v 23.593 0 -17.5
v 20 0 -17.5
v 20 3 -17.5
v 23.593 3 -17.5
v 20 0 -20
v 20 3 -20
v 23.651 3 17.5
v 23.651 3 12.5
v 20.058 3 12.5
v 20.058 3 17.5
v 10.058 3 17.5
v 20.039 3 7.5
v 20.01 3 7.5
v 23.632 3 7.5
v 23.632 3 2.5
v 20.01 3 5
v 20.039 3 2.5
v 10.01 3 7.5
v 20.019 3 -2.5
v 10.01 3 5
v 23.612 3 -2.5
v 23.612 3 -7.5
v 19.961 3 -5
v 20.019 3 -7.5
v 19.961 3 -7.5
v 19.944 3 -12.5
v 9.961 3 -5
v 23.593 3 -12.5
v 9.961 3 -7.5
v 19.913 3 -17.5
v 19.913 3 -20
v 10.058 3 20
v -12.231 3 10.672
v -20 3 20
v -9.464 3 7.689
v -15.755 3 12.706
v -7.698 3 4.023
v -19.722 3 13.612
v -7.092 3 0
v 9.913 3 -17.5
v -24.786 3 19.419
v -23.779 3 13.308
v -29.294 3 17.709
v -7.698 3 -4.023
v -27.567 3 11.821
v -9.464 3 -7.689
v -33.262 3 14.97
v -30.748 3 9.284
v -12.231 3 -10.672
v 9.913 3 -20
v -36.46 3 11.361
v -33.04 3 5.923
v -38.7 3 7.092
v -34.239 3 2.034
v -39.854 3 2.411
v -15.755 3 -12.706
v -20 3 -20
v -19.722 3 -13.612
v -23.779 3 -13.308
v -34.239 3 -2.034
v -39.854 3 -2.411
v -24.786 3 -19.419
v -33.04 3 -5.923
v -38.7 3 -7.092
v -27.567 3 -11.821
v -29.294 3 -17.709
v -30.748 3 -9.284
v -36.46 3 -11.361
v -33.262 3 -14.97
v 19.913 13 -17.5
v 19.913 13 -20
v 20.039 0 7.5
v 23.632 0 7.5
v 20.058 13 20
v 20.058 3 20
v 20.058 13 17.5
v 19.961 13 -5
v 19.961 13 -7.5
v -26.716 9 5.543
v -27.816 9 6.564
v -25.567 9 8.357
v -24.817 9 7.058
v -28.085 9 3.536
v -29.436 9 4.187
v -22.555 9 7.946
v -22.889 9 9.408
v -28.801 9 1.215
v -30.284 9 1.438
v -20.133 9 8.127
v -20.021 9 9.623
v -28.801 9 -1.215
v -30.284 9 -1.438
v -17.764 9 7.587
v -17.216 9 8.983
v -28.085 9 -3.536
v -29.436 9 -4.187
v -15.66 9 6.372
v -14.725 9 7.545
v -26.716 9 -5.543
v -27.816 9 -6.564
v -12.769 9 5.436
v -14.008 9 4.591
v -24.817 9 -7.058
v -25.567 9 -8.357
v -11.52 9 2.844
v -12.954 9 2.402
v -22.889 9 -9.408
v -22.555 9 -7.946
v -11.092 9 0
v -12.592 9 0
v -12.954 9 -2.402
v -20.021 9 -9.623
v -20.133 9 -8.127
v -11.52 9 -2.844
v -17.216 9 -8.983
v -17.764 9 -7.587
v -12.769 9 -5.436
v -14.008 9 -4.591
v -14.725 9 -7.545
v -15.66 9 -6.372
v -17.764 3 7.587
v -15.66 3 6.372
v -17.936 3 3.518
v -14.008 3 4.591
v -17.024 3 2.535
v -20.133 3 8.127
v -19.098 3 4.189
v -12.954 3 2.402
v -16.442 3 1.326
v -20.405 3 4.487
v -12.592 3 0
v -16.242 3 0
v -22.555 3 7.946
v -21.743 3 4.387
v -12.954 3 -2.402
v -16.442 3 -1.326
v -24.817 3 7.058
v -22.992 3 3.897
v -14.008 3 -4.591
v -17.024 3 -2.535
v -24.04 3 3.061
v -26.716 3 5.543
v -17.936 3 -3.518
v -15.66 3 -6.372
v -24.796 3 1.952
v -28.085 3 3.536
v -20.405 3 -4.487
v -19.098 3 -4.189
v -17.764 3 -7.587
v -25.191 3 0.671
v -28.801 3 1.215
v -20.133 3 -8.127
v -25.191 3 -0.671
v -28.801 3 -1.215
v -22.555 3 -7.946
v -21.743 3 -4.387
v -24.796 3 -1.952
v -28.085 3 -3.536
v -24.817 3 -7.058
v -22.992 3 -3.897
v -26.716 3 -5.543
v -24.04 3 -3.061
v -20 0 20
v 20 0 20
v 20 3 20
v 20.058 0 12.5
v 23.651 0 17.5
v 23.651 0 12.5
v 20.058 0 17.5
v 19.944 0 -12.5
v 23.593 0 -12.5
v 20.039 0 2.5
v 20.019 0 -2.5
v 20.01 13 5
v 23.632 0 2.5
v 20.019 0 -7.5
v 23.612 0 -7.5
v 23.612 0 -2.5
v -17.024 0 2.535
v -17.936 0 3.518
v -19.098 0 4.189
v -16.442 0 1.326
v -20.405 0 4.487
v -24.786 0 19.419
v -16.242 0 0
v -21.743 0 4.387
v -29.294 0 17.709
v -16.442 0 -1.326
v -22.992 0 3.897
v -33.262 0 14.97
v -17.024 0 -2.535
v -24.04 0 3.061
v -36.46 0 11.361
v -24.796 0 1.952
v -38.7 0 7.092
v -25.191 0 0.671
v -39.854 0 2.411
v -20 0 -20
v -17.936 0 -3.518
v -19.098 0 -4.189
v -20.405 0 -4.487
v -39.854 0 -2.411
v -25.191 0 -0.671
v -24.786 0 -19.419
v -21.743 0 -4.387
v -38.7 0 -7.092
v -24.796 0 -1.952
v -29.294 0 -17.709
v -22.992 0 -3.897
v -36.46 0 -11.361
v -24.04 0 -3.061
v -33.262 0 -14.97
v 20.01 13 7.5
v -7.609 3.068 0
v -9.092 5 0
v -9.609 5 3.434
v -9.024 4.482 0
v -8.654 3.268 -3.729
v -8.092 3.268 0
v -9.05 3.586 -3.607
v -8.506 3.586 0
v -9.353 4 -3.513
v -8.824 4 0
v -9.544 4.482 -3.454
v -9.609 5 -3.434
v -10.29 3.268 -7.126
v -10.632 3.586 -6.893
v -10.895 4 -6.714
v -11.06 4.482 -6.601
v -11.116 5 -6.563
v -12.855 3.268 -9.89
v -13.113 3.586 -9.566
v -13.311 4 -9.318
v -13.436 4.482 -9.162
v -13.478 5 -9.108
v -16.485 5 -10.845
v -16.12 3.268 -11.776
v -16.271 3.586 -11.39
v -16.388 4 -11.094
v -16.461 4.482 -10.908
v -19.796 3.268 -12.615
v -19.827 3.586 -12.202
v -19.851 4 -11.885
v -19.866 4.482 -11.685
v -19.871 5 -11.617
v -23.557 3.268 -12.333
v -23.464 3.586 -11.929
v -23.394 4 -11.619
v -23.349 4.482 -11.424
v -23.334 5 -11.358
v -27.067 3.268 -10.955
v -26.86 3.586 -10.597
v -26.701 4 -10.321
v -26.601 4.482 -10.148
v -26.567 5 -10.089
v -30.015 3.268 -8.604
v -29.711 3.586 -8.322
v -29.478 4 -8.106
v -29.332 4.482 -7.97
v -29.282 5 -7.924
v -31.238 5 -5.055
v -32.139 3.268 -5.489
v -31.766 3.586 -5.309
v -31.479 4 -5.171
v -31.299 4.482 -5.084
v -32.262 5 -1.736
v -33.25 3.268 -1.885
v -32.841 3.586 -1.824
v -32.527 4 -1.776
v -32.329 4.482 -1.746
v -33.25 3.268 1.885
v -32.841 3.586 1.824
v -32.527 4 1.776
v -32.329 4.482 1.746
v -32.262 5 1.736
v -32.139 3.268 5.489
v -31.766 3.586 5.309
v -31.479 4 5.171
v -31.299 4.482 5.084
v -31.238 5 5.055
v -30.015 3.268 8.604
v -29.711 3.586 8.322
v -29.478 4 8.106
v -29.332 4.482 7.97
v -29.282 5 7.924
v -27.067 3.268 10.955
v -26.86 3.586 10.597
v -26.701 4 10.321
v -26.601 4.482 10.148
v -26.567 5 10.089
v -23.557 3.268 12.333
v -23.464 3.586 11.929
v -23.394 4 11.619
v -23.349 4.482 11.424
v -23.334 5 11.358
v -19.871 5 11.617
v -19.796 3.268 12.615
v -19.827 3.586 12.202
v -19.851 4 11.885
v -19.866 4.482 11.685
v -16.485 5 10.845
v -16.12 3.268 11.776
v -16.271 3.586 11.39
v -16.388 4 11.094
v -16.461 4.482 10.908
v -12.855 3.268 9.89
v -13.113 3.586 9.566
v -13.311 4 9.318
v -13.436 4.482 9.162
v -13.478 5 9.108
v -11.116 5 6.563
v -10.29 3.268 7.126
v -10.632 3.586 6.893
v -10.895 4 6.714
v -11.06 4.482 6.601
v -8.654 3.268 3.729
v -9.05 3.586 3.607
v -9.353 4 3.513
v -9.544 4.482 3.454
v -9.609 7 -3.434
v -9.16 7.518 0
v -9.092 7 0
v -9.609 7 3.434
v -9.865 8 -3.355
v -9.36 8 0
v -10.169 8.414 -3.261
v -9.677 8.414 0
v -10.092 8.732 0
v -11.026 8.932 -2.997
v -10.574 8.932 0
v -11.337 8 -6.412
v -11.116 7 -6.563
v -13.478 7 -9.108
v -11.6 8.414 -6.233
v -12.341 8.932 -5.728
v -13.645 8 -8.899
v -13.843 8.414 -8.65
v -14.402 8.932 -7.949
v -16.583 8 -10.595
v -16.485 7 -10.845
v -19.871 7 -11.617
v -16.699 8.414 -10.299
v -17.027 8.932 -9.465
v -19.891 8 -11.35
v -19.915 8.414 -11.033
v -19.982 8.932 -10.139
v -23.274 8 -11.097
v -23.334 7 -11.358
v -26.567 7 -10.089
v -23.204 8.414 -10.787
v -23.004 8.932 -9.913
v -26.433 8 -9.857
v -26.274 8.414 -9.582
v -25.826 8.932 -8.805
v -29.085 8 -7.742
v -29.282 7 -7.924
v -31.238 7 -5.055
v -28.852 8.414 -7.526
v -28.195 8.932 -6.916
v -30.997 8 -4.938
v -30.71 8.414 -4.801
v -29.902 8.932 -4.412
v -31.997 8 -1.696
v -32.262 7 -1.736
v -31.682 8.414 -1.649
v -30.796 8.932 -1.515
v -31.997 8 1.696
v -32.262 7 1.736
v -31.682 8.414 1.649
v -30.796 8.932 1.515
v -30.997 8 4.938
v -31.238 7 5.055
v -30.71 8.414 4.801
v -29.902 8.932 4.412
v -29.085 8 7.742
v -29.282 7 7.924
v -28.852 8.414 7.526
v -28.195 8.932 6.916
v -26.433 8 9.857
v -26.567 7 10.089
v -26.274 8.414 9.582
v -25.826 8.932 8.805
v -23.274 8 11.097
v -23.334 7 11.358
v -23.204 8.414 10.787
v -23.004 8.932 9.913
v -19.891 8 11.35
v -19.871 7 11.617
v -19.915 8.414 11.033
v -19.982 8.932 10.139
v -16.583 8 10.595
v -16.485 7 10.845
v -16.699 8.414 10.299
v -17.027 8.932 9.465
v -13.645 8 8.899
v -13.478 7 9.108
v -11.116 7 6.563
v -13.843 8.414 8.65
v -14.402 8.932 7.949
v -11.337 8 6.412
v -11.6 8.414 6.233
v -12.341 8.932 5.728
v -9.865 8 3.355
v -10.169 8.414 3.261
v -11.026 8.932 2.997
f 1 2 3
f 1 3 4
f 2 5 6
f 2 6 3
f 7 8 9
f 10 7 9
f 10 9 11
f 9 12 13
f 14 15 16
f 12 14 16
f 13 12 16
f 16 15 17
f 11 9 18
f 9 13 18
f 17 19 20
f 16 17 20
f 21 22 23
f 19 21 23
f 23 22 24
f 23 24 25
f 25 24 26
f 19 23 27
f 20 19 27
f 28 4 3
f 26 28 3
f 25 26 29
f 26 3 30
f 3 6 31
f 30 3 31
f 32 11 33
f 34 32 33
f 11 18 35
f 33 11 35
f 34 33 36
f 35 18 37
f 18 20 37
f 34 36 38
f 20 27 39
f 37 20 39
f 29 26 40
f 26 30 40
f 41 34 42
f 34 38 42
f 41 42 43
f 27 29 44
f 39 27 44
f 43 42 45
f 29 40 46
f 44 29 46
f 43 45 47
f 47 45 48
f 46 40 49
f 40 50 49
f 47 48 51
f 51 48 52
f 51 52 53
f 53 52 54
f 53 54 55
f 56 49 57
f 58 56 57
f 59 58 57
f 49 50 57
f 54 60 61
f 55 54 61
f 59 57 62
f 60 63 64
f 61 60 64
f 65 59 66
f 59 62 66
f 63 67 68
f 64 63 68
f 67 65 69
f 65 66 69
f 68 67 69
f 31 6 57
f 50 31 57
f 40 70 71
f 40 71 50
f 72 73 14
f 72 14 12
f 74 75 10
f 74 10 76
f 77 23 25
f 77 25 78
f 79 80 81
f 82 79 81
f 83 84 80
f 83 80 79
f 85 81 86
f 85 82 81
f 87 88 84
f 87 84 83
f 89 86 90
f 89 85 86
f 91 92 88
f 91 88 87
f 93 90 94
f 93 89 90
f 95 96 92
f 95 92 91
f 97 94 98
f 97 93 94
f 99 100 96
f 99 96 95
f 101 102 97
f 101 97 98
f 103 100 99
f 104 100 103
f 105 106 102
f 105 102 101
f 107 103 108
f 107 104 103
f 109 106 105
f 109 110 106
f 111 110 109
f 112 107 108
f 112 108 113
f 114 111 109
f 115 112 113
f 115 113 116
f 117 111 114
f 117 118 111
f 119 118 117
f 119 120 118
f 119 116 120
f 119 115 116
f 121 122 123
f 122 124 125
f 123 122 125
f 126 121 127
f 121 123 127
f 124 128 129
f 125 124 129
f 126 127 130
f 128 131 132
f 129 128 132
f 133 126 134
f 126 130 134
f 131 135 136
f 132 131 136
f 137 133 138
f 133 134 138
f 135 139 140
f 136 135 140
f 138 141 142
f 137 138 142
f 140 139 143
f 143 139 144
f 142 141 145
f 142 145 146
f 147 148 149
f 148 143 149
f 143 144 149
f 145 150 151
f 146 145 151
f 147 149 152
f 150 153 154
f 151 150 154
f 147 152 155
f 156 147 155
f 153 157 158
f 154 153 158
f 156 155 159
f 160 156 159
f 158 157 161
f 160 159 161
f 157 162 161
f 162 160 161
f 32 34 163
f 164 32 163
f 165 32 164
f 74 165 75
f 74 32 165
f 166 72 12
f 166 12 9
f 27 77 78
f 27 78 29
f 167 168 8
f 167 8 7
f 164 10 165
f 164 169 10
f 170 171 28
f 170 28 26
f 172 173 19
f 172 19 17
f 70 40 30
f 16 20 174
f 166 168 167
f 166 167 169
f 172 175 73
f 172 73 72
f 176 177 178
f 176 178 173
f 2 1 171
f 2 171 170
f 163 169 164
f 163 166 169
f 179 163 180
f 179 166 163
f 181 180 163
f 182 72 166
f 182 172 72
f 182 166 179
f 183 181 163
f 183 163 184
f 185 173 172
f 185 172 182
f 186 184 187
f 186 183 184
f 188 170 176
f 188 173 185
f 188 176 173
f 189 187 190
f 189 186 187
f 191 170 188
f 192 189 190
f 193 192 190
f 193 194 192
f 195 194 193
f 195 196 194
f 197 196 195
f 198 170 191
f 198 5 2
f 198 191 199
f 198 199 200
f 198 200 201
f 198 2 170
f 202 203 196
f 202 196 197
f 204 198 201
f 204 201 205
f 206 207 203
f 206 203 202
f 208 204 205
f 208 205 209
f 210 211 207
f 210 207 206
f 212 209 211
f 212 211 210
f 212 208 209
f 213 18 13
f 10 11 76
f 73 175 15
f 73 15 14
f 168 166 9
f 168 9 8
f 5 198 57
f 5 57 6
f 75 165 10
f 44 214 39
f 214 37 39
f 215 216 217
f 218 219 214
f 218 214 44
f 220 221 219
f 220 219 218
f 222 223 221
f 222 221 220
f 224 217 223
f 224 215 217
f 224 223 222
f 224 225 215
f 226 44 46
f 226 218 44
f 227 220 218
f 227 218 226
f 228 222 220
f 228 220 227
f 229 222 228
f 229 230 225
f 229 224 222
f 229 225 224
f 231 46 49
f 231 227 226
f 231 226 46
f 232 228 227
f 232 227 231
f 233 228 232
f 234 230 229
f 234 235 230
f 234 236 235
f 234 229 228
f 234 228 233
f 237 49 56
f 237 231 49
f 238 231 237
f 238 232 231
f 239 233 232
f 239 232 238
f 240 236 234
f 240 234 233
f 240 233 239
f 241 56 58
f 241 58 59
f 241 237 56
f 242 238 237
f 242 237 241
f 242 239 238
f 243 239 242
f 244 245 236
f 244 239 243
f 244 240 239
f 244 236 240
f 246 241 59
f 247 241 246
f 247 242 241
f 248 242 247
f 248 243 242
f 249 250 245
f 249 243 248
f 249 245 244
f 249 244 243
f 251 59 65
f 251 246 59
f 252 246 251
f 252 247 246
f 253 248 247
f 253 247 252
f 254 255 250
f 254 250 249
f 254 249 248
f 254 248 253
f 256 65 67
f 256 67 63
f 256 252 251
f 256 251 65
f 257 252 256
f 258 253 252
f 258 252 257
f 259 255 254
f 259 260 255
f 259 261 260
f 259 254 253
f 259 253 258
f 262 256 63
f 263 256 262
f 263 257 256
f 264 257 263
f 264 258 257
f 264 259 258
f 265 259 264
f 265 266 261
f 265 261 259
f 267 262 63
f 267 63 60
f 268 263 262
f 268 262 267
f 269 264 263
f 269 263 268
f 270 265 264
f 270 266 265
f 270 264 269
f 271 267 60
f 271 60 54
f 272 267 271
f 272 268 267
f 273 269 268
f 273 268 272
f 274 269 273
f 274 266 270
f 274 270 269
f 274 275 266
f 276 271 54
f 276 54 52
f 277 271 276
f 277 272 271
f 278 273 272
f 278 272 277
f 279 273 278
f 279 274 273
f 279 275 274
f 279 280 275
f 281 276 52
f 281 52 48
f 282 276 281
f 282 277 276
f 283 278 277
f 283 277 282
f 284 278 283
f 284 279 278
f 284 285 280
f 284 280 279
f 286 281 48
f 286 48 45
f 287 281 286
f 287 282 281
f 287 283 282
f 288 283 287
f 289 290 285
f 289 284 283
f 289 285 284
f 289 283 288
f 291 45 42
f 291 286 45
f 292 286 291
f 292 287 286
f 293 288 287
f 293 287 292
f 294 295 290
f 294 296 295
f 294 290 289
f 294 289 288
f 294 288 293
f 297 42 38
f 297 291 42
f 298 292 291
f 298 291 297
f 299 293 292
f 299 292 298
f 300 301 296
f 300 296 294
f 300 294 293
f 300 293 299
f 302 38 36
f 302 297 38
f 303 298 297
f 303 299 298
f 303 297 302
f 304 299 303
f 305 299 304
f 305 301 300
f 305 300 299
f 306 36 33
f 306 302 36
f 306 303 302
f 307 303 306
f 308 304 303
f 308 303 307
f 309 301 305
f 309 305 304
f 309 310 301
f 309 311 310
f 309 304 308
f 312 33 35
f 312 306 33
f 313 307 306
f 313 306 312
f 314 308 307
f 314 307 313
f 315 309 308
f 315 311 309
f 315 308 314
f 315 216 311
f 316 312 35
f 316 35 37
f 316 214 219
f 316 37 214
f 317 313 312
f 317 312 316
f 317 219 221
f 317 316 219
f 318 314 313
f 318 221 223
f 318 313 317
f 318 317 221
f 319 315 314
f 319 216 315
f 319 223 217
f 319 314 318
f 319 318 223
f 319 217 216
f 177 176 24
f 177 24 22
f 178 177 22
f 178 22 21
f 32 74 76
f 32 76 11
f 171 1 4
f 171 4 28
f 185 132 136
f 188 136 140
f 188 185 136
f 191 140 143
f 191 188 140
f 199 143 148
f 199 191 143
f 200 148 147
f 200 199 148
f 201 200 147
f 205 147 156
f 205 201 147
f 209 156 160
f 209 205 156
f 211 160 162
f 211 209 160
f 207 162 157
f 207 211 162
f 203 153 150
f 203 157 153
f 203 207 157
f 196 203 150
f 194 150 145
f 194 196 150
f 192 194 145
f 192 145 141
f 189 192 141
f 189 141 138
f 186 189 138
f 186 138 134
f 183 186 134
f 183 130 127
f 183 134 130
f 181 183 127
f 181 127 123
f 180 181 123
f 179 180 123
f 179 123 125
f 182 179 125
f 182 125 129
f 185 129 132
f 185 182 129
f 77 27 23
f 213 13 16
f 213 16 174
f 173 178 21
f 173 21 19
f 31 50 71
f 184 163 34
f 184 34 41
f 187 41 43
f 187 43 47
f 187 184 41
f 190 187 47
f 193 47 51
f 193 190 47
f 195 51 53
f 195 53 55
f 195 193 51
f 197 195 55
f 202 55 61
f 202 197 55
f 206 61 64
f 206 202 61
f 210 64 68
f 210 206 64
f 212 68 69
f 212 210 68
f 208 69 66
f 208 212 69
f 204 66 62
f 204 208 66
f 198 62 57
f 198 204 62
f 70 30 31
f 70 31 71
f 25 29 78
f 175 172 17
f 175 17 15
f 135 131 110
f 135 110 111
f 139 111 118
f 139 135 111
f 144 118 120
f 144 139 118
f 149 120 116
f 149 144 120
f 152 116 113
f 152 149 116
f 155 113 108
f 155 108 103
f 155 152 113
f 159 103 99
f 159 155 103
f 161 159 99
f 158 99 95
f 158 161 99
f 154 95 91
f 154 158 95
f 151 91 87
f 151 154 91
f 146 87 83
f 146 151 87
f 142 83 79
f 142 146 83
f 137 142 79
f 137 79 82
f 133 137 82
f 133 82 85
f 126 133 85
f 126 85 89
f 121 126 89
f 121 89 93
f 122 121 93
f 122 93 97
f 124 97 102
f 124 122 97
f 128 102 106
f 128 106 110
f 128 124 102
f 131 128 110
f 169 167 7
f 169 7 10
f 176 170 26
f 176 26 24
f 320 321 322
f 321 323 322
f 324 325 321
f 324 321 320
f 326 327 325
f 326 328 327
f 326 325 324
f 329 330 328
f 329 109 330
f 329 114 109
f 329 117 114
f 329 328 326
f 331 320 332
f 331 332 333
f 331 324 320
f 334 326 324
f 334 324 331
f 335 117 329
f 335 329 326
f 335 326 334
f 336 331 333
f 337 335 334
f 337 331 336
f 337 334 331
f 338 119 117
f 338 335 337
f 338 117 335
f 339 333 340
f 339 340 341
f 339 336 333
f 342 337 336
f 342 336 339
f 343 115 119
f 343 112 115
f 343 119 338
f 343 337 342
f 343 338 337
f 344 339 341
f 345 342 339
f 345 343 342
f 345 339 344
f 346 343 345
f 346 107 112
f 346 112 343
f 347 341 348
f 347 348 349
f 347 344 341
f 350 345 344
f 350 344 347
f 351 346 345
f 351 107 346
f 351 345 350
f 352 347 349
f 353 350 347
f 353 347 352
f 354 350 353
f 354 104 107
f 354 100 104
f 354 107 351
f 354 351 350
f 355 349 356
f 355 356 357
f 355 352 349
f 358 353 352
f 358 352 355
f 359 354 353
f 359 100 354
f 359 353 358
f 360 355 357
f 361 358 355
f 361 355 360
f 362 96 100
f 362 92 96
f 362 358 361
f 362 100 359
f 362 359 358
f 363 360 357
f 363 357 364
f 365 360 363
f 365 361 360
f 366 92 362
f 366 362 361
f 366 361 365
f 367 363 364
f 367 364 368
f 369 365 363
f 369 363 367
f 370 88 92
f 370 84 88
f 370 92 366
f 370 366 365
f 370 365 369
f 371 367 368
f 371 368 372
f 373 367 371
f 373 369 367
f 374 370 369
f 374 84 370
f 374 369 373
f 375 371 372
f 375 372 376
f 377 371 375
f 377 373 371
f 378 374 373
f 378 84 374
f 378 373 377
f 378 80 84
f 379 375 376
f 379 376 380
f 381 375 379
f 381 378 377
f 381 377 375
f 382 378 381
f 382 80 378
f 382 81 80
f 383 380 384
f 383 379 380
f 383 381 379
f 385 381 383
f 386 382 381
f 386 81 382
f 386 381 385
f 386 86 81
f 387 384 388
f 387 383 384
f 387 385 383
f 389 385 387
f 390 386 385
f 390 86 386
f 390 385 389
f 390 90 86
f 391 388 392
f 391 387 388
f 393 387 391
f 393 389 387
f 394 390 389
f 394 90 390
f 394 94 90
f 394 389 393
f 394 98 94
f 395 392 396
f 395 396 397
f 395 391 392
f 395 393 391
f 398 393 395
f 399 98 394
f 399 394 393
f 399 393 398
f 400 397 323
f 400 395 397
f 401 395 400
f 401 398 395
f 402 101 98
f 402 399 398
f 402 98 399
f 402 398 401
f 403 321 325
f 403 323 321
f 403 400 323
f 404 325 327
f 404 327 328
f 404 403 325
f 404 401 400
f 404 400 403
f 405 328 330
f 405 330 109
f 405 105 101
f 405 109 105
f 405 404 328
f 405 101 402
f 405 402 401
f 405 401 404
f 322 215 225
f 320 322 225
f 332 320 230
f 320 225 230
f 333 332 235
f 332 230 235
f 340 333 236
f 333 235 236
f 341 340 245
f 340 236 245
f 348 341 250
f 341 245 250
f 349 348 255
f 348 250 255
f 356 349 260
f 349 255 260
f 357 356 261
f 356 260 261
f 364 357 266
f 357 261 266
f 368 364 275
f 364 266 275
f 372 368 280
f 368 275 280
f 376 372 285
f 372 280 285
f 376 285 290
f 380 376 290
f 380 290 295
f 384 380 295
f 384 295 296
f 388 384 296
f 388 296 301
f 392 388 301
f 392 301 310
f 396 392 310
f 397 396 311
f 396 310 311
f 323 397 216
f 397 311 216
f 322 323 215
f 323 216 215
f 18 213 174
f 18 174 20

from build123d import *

# Parameters (mm, degrees)
BOSS_EXTRUDE1_DEPTH = 3
BOSS_EXTRUDE3_DEPTH = 2.5
LPATTERN2_COUNT     = 4
LPATTERN2_PITCH     = 12.5
SKETCH3_R           = 11.65
SKETCH3_R_2         = 8.15
BOSS_EXTRUDE4_DEPTH = 6
SKETCH4_R           = 4.5
CUT_EXTRUDE2_DEPTH  = 14
FILLET1_R           = 2
FILLET2_R           = 2


with BuildPart() as part:
    # Sketch1 → Boss-Extrude1 (new body)
    with BuildSketch(Plane(origin=(0, 0, 0), x_dir=(1, 0, 0), z_dir=(0, 1, 0))):
        with BuildLine():
            Line((20, 17.5), (23.592842073, 17.5))
            Line((23.592842073, 17.5), (23.592842073, 12.5))
            Line((23.592842073, 12.5), (19.944472227, 12.5))
            Line((19.944472227, 12.5), (20.019420438, 7.500018858))
            Line((20.019420438, 7.500018858), (23.612262511, 7.500018858))
            Line((23.612262511, 7.500018858), (23.612262511, 2.500018858))
            Line((23.612262511, 2.500018858), (20.019420438, 2.500018858))
            Line((20.019420438, 2.500018858), (20.038840876, -2.499962285))
            Line((20.038840876, -2.499962285), (23.63168295, -2.499962285))
            Line((23.63168295, -2.499962285), (23.63168295, -7.499962285))
            Line((23.63168295, -7.499962285), (20.038840876, -7.499962285))
            Line((20.038840876, -7.499962285), (20.058261315, -12.499943427))
            Line((20.058261315, -12.499943427), (23.651103388, -12.499943427))
            Line((23.651103388, -12.499943427), (23.651103388, -17.499943427))
            Line((23.651103388, -17.499943427), (20.058261315, -17.499943427))
            Line((20.058261315, -17.499943427), (20, -20))
            Line((20, -20), (-20, -20))
            ThreePointArc((-20, -20), (-40, 0), (-20, 20))
            Line((-20, 20), (20, 20))
            Line((20, 20), (20, 17.5))
        make_face()
    extrude(amount=BOSS_EXTRUDE1_DEPTH)

    # Sketch2 → Boss-Extrude3 (add)
    with BuildSketch(Plane.XY.offset(20)):
        Polygon((20.058261315, 3), (20.058261315, 13), (10.058261315, 3), align=None)
    boss_extrude3 = extrude(amount=-BOSS_EXTRUDE3_DEPTH)

    # LPattern2: Boss-Extrude3 ×4
    with Locations(*[Vector(-0.003884073, 0, -0.999992457) * (i * LPATTERN2_PITCH) for i in range(1, LPATTERN2_COUNT)]):
        add(boss_extrude3)

    # Sketch3 → Boss-Extrude4 (add)
    with BuildSketch(Plane(origin=(0, 3, 0), x_dir=(1, 0, 0), z_dir=(0, 1, 0))):
        with Locations((-20.741708838, 0)):
            Circle(SKETCH3_R)
        with Locations((-20.741708838, 0)):
            Circle(SKETCH3_R_2, mode=Mode.SUBTRACT)
    extrude(amount=BOSS_EXTRUDE4_DEPTH)

    # Sketch4 → Cut-Extrude2 (cut, through all)
    with BuildSketch(Plane(origin=(0, 0, 0), x_dir=(1, 0, 0), z_dir=(0, 1, 0))):
        with Locations((-20.741708838, 0)):
            Circle(SKETCH4_R)
    extrude(amount=CUT_EXTRUDE2_DEPTH, mode=Mode.SUBTRACT)

    # Fillet1
    fillet1_edges = [part.edges().sort_by_distance(p)[0] for p in [
        (-32.391708838, 3, 0),
    ]]
    fillet(fillet1_edges, radius=FILLET1_R)

    # Fillet2
    fillet2_edges = [part.edges().sort_by_distance(p)[0] for p in [
        (-32.391708838, 9, 0),
    ]]
    fillet(fillet2_edges, radius=FILLET2_R)


solid = part.part
